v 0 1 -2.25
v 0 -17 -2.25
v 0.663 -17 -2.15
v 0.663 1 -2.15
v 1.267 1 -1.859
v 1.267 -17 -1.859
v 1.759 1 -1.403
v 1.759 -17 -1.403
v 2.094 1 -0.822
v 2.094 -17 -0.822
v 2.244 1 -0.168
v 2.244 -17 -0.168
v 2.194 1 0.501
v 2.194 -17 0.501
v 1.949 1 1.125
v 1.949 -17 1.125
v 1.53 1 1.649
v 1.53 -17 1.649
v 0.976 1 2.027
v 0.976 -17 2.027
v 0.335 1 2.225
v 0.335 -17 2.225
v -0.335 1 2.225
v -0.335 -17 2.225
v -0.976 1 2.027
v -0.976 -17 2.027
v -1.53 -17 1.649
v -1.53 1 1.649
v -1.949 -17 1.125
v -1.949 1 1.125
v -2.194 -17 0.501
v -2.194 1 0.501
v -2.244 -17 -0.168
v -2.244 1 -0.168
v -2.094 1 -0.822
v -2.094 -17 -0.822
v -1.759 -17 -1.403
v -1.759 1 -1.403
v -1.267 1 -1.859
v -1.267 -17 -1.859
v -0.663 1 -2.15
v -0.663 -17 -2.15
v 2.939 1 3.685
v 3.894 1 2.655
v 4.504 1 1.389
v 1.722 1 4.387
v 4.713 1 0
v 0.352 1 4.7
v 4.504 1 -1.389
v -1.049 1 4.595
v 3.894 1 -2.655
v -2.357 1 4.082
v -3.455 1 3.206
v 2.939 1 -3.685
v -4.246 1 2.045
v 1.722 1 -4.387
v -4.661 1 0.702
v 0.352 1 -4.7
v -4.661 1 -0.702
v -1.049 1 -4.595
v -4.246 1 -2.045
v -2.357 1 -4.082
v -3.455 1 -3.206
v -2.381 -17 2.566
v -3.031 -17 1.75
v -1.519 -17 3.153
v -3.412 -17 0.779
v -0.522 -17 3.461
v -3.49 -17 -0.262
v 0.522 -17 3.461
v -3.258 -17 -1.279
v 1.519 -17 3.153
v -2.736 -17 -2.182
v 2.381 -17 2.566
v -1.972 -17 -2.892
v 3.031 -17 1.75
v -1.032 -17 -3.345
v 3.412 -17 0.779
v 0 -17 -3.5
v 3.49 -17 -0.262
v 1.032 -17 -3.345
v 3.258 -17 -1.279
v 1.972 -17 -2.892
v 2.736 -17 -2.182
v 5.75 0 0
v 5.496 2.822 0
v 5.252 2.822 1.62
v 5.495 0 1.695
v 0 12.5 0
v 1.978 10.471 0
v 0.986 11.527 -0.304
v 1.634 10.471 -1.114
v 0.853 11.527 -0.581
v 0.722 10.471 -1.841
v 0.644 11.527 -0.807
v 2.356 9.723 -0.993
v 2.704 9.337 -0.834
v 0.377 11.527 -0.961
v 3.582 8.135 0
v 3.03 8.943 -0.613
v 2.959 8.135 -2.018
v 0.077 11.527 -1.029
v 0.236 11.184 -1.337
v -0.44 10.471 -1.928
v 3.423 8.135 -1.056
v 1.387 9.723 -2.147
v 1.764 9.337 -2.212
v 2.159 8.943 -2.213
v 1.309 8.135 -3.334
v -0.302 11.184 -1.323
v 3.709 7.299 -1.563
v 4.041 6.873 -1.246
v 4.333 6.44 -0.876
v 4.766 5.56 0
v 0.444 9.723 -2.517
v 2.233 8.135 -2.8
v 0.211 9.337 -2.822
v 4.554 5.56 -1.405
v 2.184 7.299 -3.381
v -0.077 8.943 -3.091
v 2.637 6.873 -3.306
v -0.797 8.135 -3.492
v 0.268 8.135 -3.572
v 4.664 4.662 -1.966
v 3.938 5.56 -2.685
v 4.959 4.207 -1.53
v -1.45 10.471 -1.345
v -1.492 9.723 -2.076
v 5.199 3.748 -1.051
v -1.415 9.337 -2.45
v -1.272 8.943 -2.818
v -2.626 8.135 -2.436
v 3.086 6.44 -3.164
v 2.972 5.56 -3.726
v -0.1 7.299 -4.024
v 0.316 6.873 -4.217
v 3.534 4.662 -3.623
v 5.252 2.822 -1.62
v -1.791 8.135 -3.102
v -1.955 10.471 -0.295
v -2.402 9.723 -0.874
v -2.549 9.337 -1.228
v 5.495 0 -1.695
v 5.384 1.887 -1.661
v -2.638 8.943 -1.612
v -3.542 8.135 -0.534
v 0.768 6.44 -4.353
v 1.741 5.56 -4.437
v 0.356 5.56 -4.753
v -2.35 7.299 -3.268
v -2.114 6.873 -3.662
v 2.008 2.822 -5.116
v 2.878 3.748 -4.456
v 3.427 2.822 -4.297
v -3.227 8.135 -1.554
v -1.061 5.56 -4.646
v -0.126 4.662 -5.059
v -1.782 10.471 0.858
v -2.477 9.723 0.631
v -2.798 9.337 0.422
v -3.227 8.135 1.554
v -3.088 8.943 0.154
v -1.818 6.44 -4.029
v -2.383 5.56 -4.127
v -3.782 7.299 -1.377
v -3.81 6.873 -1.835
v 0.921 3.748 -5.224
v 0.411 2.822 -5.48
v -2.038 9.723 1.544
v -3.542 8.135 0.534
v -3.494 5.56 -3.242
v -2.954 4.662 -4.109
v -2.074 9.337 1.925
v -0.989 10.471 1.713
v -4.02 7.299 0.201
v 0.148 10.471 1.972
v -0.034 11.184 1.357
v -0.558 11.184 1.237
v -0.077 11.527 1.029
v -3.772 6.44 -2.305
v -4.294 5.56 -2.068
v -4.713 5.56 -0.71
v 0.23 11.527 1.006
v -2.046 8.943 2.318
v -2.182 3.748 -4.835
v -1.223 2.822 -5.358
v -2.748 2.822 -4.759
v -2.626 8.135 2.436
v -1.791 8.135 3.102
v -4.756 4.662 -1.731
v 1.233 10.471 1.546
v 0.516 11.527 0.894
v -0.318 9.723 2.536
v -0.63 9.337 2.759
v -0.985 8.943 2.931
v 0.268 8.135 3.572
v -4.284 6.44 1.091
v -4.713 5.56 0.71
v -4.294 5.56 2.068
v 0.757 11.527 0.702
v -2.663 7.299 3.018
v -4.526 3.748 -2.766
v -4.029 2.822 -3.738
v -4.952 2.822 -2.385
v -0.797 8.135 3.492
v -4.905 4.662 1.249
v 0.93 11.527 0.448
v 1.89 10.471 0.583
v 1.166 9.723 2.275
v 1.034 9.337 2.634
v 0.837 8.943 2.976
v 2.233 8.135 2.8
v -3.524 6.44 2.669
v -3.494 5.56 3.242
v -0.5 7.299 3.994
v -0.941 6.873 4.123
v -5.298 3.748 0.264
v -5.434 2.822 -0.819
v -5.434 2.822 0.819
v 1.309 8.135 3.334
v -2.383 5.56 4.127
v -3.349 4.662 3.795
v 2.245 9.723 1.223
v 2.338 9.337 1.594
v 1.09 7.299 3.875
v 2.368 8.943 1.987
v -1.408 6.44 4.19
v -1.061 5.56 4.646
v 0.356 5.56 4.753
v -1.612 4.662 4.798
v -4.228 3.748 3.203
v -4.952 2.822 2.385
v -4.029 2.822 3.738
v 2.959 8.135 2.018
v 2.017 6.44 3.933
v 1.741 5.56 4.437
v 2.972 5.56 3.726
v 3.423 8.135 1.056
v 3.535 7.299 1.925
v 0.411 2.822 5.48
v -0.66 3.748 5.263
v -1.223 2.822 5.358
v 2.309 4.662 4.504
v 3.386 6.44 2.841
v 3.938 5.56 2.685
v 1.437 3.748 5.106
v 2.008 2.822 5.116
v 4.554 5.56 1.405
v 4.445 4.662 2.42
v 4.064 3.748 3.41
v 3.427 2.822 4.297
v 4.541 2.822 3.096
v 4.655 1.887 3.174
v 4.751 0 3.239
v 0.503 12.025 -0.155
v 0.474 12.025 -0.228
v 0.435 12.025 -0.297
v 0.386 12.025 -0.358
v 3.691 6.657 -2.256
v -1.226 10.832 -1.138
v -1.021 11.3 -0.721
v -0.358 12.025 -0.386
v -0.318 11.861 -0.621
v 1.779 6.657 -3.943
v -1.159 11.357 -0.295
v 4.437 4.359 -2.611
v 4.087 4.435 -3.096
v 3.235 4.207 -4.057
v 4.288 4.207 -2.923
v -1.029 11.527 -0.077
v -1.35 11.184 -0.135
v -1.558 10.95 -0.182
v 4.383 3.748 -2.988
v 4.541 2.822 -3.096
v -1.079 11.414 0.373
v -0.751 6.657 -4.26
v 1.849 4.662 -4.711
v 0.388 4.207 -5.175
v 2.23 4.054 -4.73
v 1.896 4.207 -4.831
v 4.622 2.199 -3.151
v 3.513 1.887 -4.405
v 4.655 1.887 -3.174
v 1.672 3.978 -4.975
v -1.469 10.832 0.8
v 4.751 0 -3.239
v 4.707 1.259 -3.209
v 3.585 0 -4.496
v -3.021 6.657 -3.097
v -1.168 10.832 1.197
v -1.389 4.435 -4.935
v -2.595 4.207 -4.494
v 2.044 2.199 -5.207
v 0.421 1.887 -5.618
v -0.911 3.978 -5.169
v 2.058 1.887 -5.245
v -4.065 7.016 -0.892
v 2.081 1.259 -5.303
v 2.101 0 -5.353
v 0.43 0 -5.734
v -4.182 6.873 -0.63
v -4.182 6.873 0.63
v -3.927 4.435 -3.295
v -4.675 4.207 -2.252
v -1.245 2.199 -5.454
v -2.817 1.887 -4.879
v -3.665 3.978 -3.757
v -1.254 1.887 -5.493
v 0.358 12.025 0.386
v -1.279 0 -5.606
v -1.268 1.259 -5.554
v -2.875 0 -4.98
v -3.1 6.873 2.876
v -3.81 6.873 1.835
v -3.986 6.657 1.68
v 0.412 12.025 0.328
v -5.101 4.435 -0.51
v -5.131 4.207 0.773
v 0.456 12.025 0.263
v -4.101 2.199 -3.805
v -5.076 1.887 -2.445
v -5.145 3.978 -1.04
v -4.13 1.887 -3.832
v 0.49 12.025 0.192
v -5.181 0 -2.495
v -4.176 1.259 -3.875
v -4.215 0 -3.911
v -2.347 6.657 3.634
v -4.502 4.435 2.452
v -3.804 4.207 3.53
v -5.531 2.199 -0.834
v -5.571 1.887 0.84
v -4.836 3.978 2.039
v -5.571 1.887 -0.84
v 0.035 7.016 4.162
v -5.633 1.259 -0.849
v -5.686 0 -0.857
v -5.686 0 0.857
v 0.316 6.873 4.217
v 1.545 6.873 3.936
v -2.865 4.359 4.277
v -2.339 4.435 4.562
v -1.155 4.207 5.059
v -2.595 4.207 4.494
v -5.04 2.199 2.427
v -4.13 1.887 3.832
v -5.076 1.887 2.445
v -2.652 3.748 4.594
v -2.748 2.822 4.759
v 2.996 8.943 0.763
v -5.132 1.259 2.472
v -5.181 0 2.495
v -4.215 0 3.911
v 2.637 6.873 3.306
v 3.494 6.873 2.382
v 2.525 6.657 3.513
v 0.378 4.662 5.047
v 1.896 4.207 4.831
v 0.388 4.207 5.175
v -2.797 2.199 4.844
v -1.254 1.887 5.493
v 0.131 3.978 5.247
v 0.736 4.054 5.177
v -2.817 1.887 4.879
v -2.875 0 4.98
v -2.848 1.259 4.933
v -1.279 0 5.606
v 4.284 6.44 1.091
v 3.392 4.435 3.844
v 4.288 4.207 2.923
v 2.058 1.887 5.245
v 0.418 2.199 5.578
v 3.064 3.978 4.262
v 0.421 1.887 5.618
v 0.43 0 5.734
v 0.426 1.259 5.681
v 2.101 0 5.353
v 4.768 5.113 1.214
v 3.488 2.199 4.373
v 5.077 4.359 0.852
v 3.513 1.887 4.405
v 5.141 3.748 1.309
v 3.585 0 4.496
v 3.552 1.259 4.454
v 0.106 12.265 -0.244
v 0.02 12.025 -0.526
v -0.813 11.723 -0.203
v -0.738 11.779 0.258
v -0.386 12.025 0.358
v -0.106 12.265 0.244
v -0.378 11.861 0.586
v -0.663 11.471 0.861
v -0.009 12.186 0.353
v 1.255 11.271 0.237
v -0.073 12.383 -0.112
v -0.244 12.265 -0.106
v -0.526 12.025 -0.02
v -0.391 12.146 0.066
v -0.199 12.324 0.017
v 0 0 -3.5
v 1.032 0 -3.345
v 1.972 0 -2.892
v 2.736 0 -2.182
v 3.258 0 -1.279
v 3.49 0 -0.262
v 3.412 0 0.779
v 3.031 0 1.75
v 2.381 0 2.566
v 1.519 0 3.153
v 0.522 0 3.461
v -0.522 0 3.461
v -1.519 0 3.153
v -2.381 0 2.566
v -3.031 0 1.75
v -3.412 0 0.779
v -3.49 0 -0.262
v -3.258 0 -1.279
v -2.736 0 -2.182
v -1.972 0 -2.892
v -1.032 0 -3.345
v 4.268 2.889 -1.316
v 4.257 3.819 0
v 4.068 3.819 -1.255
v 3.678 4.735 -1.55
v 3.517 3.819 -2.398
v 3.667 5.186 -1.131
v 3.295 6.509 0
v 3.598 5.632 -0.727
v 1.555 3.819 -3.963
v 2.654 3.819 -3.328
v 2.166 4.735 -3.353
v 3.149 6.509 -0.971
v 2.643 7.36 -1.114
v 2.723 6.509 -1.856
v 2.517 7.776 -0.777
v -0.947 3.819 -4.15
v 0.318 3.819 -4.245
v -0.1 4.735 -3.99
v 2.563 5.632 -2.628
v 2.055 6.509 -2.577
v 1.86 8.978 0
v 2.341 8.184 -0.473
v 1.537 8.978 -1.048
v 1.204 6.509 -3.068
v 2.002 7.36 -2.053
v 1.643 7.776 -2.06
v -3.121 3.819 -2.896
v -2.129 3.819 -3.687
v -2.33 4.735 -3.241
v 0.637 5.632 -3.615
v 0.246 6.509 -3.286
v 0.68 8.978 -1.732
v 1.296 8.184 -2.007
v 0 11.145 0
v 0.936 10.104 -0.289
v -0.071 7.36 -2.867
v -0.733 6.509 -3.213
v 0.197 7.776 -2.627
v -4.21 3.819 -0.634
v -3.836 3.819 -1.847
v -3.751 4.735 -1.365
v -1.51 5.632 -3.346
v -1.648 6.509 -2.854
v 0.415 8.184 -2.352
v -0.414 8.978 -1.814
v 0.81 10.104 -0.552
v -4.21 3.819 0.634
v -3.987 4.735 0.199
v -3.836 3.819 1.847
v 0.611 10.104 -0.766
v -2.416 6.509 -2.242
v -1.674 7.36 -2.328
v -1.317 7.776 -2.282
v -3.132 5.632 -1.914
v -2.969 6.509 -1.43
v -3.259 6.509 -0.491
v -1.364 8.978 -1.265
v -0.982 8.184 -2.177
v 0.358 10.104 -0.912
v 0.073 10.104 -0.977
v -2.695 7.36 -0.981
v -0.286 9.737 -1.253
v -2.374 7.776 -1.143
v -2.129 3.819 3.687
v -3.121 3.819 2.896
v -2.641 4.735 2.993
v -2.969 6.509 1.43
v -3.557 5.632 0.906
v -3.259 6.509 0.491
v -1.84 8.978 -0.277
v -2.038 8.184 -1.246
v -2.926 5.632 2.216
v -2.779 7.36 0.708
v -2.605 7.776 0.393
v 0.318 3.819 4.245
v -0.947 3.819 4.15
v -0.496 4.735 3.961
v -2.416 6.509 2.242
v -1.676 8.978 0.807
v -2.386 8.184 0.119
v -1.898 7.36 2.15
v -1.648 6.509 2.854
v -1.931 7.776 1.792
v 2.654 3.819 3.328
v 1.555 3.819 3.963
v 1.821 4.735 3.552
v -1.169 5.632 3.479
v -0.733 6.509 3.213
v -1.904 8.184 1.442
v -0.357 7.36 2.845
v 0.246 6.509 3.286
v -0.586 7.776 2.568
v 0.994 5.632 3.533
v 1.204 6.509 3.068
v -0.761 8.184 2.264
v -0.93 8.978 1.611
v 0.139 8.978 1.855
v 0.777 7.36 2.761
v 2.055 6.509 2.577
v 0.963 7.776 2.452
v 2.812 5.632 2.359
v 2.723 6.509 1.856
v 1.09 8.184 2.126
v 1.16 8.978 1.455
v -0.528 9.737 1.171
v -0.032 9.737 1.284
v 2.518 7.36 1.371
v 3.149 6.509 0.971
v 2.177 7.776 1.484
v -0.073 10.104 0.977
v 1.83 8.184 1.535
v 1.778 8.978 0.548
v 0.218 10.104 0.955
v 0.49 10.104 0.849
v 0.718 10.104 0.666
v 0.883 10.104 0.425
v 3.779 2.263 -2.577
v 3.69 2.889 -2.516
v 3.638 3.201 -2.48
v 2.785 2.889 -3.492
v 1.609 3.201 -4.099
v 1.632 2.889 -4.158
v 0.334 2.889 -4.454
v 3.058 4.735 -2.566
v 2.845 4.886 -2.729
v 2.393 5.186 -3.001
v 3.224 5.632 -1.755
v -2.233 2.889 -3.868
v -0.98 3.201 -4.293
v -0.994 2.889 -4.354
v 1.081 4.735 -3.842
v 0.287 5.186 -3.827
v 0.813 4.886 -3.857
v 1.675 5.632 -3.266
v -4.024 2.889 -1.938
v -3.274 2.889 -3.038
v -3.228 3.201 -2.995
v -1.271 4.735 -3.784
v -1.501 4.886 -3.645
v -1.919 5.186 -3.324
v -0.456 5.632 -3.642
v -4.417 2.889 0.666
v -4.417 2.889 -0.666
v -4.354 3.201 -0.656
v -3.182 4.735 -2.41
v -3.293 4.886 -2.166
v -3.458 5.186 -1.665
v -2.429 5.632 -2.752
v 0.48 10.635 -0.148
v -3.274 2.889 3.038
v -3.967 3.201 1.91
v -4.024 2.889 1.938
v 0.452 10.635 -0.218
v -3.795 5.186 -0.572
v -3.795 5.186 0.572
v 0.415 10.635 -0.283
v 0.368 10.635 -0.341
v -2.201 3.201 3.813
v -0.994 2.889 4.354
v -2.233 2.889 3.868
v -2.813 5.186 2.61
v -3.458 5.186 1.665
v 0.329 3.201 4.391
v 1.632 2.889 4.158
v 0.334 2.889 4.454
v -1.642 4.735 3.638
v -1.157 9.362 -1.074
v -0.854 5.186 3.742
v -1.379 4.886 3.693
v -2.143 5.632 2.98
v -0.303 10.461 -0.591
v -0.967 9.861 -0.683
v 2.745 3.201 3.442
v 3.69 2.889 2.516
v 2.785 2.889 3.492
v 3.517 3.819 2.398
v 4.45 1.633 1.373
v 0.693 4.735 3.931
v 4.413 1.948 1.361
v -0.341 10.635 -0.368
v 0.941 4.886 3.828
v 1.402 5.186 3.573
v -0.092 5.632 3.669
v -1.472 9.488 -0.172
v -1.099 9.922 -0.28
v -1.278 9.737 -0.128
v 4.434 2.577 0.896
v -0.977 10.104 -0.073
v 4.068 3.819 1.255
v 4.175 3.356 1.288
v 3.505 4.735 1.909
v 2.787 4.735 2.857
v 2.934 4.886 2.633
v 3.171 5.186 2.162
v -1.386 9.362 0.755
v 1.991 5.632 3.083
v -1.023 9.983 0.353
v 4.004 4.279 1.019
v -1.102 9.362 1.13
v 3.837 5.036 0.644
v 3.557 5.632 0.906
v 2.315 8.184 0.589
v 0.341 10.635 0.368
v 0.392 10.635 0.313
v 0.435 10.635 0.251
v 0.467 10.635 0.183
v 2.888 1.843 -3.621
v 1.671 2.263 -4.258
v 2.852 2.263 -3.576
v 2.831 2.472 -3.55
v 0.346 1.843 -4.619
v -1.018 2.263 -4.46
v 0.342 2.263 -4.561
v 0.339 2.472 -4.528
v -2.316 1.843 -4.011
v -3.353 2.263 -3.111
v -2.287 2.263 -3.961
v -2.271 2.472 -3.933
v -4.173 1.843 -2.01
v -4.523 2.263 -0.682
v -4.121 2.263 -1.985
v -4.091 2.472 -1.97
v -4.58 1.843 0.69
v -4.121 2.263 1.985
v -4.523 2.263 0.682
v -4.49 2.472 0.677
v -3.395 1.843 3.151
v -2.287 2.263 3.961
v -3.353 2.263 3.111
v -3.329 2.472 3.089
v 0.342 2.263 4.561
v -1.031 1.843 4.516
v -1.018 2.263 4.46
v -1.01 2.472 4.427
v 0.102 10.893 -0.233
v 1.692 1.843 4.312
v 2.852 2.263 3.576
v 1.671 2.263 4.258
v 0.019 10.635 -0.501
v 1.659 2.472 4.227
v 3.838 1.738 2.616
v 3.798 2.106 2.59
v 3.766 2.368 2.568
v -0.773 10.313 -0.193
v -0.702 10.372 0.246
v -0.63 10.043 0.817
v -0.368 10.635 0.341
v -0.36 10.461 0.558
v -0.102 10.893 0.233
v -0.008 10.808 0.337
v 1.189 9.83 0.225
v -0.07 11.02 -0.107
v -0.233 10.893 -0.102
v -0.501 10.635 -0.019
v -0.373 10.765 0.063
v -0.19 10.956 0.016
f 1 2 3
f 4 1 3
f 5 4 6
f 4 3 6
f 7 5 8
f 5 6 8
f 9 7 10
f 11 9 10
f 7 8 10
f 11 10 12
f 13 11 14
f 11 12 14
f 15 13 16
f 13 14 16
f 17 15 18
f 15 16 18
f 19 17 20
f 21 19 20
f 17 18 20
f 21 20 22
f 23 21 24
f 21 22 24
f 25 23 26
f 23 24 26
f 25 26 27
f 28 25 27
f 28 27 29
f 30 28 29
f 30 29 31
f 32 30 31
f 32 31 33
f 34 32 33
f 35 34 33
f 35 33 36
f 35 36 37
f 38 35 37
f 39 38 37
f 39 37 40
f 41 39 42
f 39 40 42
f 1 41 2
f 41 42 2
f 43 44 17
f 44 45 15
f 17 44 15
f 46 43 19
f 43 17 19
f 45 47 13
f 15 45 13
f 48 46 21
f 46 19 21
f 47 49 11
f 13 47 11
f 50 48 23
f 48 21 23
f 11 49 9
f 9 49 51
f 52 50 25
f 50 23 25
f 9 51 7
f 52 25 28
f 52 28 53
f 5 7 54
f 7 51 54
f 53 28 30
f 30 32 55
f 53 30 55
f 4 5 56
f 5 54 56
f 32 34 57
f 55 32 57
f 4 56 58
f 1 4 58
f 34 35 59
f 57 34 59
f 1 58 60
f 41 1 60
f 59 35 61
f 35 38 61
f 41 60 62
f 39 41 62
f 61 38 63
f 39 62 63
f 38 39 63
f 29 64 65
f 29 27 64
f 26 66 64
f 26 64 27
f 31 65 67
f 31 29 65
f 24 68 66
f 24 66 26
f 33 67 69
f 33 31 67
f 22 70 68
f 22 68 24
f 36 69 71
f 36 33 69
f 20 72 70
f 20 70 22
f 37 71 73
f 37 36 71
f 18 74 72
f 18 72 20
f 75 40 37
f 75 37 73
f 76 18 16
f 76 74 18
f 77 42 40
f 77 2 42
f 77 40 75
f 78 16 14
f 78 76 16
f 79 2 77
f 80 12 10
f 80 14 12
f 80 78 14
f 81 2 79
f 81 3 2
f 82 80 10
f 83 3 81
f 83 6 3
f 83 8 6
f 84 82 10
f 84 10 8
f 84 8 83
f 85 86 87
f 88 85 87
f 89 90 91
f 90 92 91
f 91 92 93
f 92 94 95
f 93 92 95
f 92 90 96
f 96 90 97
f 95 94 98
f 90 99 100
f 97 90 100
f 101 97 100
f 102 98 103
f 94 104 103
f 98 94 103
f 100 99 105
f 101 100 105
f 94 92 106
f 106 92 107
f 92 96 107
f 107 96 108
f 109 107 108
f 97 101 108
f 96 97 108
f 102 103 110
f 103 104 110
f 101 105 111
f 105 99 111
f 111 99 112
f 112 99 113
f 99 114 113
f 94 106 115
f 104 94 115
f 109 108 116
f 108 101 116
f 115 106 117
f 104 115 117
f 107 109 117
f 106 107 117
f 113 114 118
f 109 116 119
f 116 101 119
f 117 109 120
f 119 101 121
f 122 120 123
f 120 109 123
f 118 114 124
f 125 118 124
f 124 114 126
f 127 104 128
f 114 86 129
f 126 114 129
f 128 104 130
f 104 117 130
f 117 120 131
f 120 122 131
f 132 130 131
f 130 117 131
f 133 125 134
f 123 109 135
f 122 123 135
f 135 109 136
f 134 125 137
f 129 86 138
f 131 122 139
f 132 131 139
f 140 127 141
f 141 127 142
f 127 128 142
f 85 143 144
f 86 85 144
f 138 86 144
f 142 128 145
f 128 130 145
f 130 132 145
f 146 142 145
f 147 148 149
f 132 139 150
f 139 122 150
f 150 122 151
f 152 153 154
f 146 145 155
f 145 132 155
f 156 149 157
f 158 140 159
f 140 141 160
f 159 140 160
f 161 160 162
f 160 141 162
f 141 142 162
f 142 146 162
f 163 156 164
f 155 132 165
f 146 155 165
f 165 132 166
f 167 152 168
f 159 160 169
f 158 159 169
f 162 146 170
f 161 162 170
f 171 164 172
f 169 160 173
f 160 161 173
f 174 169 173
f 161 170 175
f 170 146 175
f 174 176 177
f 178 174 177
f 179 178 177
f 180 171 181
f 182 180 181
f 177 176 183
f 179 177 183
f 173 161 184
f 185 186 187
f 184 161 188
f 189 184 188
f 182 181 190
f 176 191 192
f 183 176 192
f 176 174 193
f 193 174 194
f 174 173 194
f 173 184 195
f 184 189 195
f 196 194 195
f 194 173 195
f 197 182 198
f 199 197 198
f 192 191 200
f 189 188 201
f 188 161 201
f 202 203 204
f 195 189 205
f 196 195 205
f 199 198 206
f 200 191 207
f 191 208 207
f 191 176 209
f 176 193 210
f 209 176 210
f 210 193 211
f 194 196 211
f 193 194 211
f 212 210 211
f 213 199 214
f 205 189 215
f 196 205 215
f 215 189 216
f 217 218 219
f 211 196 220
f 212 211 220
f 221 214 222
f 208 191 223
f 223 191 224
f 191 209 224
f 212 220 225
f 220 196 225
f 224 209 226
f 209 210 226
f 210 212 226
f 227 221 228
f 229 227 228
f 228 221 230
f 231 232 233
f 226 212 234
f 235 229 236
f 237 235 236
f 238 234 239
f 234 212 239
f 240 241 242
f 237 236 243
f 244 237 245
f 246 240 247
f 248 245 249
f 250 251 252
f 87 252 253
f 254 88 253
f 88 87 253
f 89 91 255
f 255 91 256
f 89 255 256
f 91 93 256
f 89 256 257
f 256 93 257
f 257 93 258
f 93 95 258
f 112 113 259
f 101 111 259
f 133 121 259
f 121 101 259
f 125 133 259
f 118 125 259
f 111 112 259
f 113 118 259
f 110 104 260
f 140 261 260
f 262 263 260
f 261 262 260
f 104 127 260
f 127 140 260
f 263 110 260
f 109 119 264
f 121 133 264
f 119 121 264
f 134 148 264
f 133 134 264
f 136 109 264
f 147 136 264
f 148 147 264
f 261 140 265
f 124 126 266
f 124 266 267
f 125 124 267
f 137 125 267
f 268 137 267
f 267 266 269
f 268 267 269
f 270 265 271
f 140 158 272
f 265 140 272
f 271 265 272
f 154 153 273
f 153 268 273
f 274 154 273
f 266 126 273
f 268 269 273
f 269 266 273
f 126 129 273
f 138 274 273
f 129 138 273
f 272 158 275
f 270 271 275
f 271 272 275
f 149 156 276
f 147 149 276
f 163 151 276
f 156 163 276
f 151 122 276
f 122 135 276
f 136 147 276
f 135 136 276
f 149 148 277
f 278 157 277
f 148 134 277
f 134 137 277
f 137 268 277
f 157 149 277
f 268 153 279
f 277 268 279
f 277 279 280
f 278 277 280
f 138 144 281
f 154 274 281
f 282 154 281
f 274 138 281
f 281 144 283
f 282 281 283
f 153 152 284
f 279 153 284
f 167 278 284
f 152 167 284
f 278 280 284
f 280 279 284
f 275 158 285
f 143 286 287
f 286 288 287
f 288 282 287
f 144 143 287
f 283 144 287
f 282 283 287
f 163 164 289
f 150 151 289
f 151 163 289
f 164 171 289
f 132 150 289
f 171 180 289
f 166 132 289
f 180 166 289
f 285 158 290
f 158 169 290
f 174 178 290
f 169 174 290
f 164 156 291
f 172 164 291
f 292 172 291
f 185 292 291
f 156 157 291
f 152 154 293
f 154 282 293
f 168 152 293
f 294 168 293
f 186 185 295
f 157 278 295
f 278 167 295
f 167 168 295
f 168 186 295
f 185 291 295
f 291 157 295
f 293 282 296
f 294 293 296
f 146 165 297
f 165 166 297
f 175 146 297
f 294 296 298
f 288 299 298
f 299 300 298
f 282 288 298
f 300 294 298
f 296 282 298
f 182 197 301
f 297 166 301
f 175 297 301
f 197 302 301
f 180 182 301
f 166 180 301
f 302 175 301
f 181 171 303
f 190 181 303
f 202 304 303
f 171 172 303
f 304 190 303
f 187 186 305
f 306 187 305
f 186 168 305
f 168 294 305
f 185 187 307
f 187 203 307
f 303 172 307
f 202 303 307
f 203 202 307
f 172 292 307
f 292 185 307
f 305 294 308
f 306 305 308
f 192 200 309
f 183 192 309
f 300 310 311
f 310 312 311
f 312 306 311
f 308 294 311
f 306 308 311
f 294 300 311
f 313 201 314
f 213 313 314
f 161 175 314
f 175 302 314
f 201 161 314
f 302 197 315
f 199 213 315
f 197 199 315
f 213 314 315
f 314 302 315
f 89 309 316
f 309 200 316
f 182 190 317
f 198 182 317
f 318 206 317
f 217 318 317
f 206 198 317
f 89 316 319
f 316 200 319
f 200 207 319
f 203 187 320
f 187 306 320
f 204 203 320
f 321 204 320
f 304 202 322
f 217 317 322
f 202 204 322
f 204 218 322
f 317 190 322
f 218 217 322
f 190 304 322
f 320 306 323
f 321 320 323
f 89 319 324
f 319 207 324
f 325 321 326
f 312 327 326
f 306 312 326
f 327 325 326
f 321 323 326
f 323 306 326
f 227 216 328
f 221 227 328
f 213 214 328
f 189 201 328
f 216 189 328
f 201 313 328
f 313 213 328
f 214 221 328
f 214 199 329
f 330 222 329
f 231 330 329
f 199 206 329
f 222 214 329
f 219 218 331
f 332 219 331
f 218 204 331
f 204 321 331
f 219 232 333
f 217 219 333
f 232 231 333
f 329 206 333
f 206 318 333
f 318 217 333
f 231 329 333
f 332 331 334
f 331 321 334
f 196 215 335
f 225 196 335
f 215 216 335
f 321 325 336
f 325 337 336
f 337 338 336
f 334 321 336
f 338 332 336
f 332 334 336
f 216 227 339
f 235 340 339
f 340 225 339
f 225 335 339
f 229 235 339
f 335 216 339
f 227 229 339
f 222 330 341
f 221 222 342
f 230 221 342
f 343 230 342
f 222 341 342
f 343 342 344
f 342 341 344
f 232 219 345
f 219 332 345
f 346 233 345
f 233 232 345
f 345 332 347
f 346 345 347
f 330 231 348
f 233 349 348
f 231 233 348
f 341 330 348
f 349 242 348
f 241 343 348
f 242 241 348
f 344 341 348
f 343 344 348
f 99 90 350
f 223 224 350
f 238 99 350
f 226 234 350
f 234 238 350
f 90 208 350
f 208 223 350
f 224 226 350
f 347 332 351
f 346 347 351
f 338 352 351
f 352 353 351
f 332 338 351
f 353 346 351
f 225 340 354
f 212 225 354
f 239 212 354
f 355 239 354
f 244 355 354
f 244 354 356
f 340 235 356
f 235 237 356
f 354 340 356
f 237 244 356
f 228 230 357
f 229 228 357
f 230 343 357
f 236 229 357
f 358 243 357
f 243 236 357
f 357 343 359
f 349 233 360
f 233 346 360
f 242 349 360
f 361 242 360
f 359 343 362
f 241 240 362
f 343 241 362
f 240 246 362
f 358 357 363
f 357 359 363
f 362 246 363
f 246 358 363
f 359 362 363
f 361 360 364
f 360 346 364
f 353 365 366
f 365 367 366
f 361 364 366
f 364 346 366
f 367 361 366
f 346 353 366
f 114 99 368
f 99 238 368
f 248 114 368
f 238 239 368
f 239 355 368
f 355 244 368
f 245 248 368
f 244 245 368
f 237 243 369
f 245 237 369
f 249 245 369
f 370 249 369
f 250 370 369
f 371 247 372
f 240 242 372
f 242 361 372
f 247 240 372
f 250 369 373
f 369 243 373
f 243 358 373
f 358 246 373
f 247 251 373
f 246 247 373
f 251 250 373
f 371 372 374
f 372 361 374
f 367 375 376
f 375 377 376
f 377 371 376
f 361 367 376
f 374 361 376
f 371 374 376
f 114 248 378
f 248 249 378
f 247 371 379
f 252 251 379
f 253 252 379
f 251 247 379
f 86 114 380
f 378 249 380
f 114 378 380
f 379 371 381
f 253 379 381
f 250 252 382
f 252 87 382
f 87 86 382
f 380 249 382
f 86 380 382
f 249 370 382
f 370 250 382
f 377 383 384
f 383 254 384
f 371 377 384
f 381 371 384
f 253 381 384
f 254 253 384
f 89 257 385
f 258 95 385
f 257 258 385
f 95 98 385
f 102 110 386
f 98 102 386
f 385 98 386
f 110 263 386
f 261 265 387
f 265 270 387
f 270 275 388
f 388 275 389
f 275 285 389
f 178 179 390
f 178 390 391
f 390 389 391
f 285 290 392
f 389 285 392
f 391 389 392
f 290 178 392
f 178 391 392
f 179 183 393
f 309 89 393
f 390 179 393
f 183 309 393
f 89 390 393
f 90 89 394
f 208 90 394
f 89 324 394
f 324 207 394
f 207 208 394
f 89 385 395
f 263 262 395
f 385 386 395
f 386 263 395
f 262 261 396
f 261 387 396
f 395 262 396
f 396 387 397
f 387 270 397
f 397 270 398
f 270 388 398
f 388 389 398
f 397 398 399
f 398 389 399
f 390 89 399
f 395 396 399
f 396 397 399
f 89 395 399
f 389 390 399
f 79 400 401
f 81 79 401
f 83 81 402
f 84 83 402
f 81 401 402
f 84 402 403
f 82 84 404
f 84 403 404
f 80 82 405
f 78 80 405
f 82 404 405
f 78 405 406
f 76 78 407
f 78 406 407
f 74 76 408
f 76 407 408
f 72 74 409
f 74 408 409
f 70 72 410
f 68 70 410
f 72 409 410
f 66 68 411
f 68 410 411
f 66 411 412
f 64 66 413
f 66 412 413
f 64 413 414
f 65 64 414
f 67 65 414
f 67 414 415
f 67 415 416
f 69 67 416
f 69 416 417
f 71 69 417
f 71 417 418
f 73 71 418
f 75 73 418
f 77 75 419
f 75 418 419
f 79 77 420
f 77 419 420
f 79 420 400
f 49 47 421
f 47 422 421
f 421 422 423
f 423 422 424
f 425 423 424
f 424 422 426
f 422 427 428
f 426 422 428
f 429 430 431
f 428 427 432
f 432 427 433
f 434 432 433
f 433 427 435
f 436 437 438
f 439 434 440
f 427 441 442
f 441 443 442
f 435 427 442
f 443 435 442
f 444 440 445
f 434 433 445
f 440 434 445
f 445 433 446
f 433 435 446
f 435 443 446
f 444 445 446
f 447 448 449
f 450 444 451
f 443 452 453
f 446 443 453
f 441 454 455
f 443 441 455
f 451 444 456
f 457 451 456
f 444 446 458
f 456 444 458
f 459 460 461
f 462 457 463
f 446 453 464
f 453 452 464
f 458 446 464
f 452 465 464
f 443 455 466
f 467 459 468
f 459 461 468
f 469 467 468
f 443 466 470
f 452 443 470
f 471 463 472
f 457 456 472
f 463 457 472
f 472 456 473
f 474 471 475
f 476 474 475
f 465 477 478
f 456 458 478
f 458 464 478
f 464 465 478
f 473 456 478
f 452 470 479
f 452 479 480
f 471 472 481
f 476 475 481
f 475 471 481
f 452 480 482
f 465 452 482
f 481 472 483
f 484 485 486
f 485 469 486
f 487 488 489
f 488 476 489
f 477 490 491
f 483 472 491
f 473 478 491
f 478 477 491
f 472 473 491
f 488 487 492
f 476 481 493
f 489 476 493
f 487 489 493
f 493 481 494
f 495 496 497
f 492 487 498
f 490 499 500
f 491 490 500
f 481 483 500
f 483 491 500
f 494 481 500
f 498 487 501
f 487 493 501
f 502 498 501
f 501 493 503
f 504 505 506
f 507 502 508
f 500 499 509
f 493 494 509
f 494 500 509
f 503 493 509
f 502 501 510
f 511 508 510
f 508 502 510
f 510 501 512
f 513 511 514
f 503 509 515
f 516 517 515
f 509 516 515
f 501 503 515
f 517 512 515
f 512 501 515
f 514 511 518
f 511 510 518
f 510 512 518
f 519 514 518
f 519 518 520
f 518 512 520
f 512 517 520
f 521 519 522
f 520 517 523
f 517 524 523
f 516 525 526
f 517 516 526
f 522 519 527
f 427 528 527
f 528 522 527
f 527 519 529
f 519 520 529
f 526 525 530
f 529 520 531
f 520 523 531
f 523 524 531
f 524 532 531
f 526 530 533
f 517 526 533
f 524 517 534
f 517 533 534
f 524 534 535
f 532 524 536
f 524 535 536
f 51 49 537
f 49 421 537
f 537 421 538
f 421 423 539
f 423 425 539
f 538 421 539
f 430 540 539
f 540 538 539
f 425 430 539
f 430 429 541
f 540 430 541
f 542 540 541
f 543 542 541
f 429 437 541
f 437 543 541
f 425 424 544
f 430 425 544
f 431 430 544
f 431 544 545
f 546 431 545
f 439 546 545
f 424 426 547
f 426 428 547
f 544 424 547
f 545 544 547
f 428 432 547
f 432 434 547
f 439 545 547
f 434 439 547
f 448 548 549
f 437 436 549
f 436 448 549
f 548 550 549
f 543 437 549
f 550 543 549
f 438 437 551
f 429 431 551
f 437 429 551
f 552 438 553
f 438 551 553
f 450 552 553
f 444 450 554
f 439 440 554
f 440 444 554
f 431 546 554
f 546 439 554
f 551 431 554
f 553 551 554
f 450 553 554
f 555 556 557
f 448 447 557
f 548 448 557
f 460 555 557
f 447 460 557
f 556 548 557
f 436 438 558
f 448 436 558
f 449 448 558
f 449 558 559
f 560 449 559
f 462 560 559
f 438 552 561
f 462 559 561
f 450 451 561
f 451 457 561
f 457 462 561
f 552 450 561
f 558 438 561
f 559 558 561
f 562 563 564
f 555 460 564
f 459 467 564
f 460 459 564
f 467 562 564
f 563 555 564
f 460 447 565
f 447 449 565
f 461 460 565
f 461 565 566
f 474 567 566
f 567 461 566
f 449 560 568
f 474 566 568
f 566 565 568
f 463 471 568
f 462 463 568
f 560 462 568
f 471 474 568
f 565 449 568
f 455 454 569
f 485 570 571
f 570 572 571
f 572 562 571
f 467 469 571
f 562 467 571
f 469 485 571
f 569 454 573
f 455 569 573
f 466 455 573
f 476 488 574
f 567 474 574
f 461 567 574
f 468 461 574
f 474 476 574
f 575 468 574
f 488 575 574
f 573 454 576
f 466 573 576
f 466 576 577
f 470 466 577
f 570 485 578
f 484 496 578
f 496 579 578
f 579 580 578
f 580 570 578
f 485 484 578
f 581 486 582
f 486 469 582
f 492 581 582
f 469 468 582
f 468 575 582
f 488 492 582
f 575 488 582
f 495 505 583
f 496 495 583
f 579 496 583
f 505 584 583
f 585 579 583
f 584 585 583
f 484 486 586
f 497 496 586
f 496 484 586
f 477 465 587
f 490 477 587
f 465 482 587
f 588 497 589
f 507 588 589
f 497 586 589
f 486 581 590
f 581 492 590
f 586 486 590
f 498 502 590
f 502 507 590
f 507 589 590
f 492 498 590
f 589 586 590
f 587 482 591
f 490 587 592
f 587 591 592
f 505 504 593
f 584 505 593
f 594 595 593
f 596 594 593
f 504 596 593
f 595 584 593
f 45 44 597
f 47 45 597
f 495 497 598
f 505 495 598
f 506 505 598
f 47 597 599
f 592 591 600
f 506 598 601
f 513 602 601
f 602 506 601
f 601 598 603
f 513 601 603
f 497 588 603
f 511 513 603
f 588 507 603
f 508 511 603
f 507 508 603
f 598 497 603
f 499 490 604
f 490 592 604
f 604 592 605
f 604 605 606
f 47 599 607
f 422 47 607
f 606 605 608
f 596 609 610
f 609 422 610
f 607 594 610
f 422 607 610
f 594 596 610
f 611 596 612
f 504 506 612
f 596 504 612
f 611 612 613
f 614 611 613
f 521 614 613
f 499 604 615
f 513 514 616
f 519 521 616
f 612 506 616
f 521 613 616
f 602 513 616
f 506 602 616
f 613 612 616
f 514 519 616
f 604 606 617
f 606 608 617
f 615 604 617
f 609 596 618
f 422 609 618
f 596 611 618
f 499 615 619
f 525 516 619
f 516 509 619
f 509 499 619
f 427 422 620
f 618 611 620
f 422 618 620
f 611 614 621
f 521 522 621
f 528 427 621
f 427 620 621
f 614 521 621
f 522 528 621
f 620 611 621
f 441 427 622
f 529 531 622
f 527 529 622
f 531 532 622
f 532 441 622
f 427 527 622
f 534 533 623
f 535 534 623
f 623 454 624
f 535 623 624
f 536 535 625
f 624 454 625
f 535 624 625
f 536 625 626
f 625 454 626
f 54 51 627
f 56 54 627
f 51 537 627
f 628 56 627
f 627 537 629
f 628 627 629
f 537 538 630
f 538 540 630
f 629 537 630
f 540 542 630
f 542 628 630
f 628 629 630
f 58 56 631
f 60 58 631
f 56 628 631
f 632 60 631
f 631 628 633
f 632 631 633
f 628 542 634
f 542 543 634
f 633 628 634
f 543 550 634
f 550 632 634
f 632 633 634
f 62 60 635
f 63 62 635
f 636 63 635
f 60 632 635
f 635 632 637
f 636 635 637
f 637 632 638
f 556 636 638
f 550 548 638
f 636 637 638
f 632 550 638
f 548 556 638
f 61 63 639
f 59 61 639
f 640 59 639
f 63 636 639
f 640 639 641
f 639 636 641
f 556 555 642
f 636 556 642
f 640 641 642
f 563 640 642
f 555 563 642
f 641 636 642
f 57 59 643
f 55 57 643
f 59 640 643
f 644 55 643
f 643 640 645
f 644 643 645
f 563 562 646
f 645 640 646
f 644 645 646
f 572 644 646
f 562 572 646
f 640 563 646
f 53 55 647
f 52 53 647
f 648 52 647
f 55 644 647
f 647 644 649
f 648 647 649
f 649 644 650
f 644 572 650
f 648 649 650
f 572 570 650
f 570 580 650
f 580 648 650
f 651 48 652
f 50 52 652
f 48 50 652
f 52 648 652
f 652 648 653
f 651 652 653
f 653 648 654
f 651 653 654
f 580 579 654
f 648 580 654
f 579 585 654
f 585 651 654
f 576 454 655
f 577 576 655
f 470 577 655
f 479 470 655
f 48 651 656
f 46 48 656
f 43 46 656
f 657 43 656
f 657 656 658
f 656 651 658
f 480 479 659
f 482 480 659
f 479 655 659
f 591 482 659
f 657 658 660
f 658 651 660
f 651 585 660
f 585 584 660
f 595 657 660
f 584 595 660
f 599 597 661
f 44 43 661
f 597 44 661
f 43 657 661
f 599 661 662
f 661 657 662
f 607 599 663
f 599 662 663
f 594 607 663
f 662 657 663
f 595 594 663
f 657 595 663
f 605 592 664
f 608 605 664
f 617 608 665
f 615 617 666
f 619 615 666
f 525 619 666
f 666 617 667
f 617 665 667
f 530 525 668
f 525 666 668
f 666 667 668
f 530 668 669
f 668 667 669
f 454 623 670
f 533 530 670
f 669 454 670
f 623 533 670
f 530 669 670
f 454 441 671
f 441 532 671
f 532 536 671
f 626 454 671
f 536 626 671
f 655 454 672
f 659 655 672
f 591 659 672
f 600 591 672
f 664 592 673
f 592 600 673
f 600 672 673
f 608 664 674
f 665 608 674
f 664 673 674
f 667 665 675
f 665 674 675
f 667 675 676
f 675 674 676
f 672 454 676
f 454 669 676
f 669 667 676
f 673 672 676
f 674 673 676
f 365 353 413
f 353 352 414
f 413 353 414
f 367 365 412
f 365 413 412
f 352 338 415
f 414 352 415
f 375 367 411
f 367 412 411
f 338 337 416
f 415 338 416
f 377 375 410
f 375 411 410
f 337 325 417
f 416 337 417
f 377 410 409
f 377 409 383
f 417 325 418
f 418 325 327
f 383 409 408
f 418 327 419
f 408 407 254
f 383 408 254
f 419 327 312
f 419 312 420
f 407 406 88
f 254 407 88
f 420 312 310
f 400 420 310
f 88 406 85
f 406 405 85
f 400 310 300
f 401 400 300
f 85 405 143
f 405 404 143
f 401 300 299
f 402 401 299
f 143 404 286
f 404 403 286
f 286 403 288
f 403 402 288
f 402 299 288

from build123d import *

# Parameters (mm, degrees)
SKETCH_2_R          = 3.5
EXTRUDE_1_DEPTH     = 17
SKETCH_3_R          = 2.25
CUT_EXTRUDE_1_DEPTH = 18


with BuildPart() as part:
    # 草图1 → 旋转1 (revolve)
    with BuildSketch(Plane.XY):
        with BuildLine():
            Line((0, 0), (0, 1))
            Line((0, 1), (4.713145709, 1))
            ThreePointArc((4.713145709, 1), (3.295495491, 6.508537741), (0, 11.144638437))
            Line((0, 11.144638437), (0, 12.5))
            ThreePointArc((0, 12.5), (4.228807467, 6.872751435), (5.75, 0))
            Line((5.75, 0), (0, 0))
        make_face()
    revolve(axis=Axis((0, 11.144638437, 0), (0, 1, 0)))

    # 草图2 → 凸台-拉伸1 (add)
    with BuildSketch(Plane.XZ):
        with Locations(Location((0, 0, 0), (0, 0, 270))):
            Circle(SKETCH_2_R)
    extrude(amount=EXTRUDE_1_DEPTH)

    # 草图3 → 切除-拉伸1 (cut)
    with BuildSketch(Plane.XZ.offset(17)):
        with Locations(Location((0, 0, 0), (0, 0, 270))):
            Circle(SKETCH_3_R)
    extrude(amount=-CUT_EXTRUDE_1_DEPTH, mode=Mode.SUBTRACT)


solid = part.part
